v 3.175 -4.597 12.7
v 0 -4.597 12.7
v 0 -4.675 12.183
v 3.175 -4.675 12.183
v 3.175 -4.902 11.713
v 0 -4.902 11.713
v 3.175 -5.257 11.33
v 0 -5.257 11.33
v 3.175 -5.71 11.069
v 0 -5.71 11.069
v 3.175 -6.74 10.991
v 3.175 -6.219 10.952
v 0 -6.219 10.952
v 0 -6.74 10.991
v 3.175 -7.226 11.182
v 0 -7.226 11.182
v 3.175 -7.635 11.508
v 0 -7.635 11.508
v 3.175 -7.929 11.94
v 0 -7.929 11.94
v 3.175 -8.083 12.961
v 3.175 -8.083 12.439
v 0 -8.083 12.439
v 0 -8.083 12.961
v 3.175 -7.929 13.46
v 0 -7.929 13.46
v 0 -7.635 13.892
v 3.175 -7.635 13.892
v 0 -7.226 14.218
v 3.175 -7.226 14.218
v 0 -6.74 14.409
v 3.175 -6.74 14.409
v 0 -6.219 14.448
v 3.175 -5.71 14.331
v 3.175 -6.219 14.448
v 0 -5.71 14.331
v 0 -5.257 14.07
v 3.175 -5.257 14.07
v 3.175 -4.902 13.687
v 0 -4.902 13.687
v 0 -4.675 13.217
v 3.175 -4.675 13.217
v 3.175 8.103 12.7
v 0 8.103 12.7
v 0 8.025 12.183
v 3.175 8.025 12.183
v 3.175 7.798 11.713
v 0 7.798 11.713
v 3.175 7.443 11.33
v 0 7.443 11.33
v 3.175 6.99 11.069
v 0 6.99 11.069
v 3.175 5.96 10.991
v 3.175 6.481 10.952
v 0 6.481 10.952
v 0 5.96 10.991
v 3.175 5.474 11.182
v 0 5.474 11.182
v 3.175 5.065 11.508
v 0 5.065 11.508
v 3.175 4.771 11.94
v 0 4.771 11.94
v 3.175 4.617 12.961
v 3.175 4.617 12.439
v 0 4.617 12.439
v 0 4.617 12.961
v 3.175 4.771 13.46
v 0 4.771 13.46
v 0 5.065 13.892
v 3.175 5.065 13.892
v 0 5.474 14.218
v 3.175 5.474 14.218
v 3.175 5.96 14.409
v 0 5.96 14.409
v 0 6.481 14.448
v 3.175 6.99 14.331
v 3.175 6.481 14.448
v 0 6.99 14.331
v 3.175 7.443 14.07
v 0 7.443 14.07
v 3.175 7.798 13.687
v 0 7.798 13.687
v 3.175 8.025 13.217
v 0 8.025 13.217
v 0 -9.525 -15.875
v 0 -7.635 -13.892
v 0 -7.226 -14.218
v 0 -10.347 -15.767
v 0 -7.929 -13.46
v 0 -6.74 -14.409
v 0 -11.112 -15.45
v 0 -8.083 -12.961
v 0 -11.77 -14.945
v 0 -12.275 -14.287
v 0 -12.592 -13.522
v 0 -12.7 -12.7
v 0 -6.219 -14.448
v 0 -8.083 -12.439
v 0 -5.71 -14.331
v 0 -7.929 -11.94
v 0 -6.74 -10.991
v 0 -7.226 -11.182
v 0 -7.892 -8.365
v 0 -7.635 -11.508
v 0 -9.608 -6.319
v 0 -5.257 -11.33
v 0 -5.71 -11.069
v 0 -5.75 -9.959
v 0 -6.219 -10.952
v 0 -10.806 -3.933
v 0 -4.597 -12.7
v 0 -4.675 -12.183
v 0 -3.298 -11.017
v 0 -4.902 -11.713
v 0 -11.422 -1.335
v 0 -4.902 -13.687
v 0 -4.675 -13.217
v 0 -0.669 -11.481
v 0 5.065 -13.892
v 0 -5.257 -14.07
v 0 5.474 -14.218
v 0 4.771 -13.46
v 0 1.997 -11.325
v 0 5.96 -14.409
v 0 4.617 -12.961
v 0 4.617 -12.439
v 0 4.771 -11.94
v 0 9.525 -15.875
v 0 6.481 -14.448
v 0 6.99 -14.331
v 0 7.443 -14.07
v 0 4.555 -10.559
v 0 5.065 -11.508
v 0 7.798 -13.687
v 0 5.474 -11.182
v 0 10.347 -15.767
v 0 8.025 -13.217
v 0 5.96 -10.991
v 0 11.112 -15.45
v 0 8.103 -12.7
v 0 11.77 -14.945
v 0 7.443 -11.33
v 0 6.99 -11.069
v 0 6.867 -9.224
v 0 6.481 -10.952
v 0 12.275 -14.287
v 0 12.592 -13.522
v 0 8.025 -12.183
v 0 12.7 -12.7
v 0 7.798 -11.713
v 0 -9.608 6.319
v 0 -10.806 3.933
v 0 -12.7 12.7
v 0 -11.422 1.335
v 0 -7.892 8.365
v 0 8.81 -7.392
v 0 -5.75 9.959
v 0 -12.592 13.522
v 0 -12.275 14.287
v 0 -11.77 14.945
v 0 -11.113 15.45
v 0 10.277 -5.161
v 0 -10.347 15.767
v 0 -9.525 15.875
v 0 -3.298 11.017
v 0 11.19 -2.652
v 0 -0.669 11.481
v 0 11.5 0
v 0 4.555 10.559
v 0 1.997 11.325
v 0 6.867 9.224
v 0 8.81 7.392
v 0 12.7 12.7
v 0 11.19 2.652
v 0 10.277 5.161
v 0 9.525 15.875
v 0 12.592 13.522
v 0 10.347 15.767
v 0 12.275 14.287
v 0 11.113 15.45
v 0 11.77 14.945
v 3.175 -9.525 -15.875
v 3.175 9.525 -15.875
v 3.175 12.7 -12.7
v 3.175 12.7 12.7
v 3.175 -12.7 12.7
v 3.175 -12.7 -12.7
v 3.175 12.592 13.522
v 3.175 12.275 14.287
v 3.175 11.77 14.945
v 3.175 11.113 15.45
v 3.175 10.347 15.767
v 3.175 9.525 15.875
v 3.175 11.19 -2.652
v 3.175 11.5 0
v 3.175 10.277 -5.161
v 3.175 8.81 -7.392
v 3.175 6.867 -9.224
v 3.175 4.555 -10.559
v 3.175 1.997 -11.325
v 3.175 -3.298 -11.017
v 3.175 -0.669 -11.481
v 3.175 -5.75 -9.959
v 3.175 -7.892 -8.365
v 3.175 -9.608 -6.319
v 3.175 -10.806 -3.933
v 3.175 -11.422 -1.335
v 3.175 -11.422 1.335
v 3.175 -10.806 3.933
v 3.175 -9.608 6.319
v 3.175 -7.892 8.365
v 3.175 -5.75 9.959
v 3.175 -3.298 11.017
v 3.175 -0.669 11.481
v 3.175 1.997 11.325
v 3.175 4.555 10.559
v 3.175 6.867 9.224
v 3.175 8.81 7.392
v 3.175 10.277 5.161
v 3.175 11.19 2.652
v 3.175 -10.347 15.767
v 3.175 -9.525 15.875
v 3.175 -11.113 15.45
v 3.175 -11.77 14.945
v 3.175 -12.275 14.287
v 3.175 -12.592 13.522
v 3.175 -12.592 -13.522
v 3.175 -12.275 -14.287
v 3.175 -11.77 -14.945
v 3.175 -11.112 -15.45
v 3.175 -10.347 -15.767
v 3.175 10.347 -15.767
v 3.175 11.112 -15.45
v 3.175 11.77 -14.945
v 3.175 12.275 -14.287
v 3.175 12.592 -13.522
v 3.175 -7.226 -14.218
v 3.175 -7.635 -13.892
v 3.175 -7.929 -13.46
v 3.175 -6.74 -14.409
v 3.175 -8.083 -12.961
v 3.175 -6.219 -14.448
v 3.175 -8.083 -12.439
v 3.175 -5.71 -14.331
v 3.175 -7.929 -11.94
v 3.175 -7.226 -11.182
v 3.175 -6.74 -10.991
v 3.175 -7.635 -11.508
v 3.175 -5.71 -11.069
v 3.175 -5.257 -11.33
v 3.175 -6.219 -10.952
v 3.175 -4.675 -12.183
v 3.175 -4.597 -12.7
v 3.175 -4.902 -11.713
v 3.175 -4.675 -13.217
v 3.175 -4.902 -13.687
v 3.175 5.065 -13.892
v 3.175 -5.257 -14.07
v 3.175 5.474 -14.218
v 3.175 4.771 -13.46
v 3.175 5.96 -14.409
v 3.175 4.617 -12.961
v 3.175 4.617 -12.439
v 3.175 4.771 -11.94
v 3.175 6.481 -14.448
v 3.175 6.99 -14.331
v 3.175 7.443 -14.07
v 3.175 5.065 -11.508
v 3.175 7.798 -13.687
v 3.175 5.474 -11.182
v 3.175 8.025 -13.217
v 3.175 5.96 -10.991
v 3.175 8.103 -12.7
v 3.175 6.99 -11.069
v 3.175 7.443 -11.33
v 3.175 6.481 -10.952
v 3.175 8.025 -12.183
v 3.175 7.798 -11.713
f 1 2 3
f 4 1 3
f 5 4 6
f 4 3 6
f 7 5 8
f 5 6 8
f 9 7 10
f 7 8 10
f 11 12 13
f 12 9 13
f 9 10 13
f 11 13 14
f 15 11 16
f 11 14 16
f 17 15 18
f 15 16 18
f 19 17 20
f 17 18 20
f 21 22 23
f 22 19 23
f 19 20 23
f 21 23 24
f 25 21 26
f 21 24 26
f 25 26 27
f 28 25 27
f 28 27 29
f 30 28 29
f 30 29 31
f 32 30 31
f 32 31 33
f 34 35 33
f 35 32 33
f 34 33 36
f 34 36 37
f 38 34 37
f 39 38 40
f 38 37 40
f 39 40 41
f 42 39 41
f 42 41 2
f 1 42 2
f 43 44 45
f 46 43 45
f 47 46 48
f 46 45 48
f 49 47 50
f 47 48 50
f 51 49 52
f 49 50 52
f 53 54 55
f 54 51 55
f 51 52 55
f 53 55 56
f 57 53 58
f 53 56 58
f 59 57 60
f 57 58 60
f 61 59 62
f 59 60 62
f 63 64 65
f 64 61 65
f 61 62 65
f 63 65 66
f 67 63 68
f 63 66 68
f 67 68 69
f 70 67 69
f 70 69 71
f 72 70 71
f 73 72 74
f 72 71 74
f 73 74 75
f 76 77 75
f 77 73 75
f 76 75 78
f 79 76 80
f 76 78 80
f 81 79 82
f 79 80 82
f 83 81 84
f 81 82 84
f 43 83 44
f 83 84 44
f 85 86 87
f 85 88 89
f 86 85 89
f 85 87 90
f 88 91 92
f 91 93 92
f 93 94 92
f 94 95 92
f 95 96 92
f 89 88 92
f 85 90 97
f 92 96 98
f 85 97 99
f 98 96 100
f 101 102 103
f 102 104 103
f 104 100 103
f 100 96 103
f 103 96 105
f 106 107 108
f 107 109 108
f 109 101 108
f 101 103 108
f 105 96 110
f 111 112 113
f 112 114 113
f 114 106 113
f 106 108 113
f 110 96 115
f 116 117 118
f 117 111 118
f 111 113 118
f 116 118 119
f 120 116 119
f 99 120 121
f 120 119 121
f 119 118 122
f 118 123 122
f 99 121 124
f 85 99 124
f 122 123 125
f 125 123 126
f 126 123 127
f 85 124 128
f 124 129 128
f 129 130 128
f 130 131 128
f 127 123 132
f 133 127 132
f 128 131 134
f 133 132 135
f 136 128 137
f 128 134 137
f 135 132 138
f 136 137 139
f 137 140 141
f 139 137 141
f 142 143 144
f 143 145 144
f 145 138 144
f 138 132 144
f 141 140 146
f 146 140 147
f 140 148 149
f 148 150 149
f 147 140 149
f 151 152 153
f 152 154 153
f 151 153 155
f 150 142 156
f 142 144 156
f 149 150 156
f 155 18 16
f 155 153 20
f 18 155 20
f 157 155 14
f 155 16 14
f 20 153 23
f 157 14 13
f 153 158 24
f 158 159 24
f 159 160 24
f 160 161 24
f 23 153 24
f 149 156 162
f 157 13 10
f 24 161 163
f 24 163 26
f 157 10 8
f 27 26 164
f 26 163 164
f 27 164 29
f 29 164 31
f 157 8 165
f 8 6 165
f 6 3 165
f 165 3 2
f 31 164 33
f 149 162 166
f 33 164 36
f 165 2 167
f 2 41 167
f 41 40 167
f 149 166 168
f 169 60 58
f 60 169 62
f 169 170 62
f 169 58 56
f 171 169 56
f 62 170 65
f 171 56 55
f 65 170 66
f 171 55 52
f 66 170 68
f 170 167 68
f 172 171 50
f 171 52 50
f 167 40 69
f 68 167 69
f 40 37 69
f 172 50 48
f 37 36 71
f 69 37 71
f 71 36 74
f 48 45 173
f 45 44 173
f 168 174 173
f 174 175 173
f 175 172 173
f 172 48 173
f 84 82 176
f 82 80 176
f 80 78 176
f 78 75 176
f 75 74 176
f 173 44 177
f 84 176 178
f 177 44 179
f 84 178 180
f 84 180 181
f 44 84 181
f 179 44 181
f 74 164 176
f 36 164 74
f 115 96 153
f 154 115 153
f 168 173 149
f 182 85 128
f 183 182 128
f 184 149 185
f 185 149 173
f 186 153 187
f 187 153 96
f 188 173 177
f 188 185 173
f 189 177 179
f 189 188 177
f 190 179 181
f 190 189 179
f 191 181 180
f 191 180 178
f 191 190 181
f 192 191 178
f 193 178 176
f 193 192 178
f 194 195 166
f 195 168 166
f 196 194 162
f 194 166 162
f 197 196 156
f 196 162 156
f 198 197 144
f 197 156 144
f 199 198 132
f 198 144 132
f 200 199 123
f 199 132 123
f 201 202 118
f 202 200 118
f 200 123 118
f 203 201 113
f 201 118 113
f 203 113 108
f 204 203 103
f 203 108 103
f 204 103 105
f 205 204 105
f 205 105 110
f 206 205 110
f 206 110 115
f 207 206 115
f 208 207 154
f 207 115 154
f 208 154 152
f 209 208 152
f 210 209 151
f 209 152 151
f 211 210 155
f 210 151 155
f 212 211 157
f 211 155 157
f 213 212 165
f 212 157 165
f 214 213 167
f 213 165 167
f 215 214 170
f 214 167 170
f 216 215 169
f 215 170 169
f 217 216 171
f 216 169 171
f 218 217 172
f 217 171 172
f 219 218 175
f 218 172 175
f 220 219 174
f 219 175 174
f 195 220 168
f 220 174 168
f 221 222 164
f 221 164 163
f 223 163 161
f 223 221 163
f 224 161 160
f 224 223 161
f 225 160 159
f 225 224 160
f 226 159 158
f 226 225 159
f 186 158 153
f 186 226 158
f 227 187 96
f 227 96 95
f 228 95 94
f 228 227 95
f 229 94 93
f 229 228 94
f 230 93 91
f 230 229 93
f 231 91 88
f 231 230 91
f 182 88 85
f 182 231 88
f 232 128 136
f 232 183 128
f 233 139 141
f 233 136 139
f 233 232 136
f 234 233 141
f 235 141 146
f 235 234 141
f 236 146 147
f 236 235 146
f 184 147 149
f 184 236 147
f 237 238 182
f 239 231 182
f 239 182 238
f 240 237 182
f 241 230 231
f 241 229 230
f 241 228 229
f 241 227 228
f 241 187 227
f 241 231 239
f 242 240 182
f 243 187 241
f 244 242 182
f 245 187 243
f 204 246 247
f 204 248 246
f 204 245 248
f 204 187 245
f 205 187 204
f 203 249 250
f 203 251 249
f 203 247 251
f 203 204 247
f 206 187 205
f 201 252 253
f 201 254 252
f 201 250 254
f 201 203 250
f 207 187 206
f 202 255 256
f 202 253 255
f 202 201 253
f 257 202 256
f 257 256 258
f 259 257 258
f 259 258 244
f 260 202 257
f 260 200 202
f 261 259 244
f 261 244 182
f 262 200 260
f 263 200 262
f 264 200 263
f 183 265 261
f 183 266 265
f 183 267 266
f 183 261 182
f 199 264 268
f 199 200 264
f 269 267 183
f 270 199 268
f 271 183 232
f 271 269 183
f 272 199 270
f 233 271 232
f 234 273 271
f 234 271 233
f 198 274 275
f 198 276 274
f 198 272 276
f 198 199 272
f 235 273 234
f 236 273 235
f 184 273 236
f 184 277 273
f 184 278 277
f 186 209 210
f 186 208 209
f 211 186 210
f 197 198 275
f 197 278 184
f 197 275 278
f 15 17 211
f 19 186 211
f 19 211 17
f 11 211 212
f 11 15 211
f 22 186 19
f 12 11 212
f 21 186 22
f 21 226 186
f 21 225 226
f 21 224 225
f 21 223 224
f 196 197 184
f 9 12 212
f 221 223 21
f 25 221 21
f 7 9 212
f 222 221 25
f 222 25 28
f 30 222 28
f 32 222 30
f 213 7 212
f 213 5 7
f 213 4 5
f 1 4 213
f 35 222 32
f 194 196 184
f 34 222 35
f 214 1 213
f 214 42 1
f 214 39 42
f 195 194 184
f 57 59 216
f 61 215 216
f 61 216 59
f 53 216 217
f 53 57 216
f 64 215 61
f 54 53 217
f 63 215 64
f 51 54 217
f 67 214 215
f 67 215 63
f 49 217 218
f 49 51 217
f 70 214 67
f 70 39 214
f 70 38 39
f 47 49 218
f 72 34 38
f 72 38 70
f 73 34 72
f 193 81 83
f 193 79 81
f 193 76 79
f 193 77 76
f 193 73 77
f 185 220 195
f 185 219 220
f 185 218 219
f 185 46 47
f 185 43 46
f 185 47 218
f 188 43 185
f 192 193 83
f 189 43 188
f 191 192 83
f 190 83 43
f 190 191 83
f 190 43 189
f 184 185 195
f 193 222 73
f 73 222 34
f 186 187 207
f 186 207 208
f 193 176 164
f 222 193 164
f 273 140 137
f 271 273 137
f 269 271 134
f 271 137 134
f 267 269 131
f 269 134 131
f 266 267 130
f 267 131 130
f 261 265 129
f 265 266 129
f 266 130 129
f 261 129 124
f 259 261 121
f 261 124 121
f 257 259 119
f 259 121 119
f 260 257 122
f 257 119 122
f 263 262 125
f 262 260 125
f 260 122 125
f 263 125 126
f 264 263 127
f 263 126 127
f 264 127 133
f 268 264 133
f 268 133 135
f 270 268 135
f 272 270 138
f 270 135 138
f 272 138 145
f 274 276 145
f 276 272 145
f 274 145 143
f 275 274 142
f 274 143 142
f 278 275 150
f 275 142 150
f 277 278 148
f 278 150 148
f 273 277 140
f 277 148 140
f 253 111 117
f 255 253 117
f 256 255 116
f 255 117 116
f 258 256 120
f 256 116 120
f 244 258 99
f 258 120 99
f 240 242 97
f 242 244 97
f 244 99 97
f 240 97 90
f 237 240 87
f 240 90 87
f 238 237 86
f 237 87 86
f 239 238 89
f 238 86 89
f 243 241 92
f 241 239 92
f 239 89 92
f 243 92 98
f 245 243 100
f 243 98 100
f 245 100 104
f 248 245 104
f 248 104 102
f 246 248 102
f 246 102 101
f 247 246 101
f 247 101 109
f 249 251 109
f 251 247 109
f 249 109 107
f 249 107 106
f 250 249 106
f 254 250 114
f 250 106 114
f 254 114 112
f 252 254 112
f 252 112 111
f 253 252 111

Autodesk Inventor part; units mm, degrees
ref_plane "YZ Plane" through (0, 0, 0) normal (1, 0, 0) x (0, 1, 0)
ref_plane "XZ Plane" through (0, 0, 0) normal (0, 1, 0) x (-1, 0, 0)
ref_plane "XY Plane" through (0, 0, 0) normal (0, 0, 1) x (1, 0, 0)
sketch "Sketch1" plane through (0, 0, 0) normal (1, 0, 0) x (0, 1, 0)
  circle A0 centre (0, 0) radius 11.5
  line L0 (0, 0) -> (0, -12.7) construction
  line L1 (0, -12.7) -> (6.35, -12.7) construction
  circle A1 centre (6.35, -12.7) radius 1.7526
  circle A2 centre (-6.35, -12.7) radius 1.7526
  circle A3 centre (6.35, 12.7) radius 1.7526
  circle A4 centre (-6.35, 12.7) radius 1.7526
  line L2 (12.7, 15.875) -> (-12.7, 15.875)
  line L3 (-12.7, 15.875) -> (-12.7, -15.875)
  line L4 (-12.7, -15.875) -> (12.7, -15.875)
  line L5 (12.7, -15.875) -> (12.7, 15.875)
  line L6 (12.7, 15.875) -> (-12.7, -15.875) construction
  line L7 (-12.7, 15.875) -> (12.7, -15.875) construction
  line L8 (0, 0) -> (9, 0) construction
  dimension "d0" = 23
  dimension "d1" = 12.7
  dimension "d2" = 6.35
  dimension "d3" = 3.5052
  dimension "d6" = 12.7
  dimension "d9" = 25.4
  dimension "d12" = 25.4
  dimension "d13" = 31.75
  dimension "d15" = 9
extrude "Extrusion1" add sketch "Sketch1" along normal blind 3.175
fillet "Fillet1" radius 3.175 4 edges at (1.5875, 12.7, 15.875) (1.5875, -12.7, 15.875) (1.5875, 12.7, -15.875) (1.5875, -12.7, -15.875)
equation "\"d9\" = 2 * d1"
properties part number "Motor Plates" material "UHMW, Black"
